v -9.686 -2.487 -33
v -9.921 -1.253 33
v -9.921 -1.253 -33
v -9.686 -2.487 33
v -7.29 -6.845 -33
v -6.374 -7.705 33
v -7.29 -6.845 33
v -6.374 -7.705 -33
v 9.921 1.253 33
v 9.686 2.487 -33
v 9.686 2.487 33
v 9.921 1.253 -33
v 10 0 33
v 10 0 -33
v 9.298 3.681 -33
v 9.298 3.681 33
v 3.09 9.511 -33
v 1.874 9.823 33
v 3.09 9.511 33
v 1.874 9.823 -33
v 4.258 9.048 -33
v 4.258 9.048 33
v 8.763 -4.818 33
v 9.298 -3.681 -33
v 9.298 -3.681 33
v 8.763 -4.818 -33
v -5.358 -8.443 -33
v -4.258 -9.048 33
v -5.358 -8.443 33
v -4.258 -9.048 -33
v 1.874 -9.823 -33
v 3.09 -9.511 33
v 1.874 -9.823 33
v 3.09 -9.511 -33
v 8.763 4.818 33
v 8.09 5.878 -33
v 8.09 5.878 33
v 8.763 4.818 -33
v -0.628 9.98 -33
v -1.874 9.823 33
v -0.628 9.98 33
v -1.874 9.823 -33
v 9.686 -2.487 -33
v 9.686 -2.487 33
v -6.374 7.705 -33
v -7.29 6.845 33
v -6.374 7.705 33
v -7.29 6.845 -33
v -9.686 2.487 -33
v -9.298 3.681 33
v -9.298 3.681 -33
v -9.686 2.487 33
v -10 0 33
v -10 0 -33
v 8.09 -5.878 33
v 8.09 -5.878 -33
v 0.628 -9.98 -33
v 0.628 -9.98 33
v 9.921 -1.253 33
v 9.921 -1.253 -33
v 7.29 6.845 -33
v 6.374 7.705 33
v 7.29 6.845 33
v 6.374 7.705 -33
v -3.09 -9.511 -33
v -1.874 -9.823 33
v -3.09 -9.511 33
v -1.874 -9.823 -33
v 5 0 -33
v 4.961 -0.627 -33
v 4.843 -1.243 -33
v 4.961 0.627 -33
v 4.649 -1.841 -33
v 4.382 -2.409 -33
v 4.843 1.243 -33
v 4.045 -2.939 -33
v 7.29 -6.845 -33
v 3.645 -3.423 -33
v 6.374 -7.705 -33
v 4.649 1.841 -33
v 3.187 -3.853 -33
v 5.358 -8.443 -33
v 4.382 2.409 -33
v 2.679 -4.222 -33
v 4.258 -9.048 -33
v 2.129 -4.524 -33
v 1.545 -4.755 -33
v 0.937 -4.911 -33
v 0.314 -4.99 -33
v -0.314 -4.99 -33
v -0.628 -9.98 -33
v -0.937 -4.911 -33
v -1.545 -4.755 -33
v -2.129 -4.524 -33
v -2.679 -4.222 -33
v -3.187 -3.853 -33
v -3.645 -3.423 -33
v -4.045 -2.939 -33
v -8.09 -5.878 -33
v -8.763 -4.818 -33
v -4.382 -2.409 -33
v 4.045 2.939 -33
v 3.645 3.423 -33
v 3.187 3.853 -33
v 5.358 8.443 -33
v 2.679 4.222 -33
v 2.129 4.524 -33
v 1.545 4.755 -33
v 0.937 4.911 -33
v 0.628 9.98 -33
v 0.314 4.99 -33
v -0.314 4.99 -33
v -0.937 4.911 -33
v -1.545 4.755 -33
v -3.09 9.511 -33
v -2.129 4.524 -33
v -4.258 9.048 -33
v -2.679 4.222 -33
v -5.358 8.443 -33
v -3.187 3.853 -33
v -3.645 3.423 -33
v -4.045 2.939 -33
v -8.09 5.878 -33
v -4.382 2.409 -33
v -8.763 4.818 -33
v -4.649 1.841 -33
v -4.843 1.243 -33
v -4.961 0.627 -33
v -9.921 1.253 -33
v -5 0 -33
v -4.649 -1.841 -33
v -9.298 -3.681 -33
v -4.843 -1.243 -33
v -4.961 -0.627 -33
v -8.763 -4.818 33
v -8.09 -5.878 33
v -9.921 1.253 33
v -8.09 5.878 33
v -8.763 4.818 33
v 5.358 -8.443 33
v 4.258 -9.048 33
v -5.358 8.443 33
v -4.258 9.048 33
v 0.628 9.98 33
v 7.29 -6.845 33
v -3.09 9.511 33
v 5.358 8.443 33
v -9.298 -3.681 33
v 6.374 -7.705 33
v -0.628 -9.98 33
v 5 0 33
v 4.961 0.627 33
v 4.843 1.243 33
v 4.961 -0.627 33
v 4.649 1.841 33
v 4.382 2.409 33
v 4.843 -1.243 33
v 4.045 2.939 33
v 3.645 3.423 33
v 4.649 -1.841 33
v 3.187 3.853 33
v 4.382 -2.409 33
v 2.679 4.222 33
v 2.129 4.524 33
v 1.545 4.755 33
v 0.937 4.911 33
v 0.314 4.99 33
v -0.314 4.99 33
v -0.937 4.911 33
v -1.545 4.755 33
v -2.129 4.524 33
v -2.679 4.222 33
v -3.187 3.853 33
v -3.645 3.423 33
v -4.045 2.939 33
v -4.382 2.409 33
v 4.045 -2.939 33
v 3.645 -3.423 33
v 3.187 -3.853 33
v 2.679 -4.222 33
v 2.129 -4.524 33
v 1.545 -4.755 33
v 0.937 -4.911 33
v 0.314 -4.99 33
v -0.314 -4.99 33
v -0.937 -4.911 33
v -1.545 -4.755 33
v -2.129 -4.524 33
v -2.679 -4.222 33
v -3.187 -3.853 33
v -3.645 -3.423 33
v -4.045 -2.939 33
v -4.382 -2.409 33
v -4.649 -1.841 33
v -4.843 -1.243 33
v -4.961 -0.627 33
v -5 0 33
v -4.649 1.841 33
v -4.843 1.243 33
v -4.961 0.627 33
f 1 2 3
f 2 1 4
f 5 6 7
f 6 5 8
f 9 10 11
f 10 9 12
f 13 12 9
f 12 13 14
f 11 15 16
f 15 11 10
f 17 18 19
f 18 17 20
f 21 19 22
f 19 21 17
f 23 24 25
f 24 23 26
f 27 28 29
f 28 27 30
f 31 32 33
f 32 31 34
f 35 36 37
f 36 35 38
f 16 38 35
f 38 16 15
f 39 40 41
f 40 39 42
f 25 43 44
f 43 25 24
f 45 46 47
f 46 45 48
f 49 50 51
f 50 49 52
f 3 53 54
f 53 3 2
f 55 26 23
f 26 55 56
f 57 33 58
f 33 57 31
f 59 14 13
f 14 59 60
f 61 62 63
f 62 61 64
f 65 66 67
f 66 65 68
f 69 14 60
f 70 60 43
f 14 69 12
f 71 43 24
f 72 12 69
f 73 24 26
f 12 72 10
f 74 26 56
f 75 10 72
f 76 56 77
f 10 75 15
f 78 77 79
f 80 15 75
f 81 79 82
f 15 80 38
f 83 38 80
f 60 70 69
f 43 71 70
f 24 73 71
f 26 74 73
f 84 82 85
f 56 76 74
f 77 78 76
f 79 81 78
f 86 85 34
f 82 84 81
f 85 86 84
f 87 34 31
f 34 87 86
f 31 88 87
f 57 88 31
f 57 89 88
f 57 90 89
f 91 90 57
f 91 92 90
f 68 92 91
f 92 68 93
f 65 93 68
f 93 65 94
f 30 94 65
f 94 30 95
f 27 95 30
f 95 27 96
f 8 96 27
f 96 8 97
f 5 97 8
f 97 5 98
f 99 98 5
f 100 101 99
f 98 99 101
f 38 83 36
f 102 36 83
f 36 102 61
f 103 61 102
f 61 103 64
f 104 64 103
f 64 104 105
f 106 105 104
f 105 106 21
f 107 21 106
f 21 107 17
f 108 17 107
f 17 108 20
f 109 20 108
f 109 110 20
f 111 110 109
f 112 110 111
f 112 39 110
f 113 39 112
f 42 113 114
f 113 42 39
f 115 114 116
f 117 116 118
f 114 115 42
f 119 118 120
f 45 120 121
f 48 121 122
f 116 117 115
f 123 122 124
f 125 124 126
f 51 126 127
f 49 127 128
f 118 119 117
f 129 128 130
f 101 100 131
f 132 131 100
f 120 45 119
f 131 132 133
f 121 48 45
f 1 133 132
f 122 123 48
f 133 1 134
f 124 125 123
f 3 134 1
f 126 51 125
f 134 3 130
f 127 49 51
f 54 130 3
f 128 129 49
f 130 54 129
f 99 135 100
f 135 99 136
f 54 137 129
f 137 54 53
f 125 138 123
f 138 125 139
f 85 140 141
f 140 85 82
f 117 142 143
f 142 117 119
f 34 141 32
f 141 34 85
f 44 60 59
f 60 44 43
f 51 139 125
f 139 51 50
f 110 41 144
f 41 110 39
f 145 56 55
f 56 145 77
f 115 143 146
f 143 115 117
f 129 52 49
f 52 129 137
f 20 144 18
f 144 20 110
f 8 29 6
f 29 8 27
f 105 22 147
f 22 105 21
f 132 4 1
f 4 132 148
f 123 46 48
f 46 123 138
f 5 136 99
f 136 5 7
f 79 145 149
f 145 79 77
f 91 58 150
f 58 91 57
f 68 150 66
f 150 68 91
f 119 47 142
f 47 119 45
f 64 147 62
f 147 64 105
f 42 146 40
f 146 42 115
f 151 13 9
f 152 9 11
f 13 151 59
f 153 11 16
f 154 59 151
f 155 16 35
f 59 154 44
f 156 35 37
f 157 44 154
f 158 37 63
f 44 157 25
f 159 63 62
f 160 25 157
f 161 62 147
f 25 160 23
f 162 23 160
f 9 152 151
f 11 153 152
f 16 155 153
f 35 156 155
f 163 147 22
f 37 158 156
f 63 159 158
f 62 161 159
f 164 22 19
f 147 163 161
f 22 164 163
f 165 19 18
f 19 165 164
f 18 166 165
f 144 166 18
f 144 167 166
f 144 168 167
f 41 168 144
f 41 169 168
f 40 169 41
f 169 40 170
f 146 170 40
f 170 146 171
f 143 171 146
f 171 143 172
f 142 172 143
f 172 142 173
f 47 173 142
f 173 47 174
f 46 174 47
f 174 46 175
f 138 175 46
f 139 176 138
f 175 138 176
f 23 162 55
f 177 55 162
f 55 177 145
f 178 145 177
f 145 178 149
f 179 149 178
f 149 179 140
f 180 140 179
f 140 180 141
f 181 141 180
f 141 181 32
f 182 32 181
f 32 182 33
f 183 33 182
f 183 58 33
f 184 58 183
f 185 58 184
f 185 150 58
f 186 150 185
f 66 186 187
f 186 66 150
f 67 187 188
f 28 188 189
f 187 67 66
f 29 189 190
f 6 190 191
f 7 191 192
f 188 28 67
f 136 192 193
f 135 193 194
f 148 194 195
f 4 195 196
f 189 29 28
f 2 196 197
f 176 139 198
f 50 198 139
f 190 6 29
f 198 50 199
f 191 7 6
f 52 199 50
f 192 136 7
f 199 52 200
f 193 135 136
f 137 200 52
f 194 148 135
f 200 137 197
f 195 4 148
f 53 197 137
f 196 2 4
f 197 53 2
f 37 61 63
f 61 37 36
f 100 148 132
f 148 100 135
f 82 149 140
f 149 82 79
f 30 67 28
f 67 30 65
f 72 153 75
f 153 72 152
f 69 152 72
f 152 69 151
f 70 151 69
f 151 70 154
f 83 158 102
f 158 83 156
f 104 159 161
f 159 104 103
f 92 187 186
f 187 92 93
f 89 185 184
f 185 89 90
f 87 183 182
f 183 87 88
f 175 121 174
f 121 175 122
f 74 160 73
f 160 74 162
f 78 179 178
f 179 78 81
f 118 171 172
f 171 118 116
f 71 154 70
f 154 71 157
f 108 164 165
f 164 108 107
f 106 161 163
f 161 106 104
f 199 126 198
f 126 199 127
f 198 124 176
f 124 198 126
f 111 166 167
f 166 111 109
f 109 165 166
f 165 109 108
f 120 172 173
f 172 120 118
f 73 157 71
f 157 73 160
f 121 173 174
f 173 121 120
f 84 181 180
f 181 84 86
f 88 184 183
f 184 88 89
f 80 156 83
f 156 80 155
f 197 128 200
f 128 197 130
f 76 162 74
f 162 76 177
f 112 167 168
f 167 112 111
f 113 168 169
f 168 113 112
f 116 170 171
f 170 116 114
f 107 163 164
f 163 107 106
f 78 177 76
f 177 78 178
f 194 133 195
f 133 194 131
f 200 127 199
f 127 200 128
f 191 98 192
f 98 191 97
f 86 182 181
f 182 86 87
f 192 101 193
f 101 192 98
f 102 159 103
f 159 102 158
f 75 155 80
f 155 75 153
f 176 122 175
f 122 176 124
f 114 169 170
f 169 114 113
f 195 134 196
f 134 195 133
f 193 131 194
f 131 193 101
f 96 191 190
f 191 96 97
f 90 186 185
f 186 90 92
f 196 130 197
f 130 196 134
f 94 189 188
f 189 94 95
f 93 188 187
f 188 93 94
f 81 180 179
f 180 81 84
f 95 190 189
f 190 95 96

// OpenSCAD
$fn = 50;


difference() {
	union() {
		translate(v = [0, 0, -33.0000000000]) {
			cylinder(h = 66, r = 10.0000000000);
		}
	}
	union() {
		translate(v = [0, 0, -100.0000000000]) {
			cylinder(h = 200, r = 5.0000000000);
		}
	}
}
